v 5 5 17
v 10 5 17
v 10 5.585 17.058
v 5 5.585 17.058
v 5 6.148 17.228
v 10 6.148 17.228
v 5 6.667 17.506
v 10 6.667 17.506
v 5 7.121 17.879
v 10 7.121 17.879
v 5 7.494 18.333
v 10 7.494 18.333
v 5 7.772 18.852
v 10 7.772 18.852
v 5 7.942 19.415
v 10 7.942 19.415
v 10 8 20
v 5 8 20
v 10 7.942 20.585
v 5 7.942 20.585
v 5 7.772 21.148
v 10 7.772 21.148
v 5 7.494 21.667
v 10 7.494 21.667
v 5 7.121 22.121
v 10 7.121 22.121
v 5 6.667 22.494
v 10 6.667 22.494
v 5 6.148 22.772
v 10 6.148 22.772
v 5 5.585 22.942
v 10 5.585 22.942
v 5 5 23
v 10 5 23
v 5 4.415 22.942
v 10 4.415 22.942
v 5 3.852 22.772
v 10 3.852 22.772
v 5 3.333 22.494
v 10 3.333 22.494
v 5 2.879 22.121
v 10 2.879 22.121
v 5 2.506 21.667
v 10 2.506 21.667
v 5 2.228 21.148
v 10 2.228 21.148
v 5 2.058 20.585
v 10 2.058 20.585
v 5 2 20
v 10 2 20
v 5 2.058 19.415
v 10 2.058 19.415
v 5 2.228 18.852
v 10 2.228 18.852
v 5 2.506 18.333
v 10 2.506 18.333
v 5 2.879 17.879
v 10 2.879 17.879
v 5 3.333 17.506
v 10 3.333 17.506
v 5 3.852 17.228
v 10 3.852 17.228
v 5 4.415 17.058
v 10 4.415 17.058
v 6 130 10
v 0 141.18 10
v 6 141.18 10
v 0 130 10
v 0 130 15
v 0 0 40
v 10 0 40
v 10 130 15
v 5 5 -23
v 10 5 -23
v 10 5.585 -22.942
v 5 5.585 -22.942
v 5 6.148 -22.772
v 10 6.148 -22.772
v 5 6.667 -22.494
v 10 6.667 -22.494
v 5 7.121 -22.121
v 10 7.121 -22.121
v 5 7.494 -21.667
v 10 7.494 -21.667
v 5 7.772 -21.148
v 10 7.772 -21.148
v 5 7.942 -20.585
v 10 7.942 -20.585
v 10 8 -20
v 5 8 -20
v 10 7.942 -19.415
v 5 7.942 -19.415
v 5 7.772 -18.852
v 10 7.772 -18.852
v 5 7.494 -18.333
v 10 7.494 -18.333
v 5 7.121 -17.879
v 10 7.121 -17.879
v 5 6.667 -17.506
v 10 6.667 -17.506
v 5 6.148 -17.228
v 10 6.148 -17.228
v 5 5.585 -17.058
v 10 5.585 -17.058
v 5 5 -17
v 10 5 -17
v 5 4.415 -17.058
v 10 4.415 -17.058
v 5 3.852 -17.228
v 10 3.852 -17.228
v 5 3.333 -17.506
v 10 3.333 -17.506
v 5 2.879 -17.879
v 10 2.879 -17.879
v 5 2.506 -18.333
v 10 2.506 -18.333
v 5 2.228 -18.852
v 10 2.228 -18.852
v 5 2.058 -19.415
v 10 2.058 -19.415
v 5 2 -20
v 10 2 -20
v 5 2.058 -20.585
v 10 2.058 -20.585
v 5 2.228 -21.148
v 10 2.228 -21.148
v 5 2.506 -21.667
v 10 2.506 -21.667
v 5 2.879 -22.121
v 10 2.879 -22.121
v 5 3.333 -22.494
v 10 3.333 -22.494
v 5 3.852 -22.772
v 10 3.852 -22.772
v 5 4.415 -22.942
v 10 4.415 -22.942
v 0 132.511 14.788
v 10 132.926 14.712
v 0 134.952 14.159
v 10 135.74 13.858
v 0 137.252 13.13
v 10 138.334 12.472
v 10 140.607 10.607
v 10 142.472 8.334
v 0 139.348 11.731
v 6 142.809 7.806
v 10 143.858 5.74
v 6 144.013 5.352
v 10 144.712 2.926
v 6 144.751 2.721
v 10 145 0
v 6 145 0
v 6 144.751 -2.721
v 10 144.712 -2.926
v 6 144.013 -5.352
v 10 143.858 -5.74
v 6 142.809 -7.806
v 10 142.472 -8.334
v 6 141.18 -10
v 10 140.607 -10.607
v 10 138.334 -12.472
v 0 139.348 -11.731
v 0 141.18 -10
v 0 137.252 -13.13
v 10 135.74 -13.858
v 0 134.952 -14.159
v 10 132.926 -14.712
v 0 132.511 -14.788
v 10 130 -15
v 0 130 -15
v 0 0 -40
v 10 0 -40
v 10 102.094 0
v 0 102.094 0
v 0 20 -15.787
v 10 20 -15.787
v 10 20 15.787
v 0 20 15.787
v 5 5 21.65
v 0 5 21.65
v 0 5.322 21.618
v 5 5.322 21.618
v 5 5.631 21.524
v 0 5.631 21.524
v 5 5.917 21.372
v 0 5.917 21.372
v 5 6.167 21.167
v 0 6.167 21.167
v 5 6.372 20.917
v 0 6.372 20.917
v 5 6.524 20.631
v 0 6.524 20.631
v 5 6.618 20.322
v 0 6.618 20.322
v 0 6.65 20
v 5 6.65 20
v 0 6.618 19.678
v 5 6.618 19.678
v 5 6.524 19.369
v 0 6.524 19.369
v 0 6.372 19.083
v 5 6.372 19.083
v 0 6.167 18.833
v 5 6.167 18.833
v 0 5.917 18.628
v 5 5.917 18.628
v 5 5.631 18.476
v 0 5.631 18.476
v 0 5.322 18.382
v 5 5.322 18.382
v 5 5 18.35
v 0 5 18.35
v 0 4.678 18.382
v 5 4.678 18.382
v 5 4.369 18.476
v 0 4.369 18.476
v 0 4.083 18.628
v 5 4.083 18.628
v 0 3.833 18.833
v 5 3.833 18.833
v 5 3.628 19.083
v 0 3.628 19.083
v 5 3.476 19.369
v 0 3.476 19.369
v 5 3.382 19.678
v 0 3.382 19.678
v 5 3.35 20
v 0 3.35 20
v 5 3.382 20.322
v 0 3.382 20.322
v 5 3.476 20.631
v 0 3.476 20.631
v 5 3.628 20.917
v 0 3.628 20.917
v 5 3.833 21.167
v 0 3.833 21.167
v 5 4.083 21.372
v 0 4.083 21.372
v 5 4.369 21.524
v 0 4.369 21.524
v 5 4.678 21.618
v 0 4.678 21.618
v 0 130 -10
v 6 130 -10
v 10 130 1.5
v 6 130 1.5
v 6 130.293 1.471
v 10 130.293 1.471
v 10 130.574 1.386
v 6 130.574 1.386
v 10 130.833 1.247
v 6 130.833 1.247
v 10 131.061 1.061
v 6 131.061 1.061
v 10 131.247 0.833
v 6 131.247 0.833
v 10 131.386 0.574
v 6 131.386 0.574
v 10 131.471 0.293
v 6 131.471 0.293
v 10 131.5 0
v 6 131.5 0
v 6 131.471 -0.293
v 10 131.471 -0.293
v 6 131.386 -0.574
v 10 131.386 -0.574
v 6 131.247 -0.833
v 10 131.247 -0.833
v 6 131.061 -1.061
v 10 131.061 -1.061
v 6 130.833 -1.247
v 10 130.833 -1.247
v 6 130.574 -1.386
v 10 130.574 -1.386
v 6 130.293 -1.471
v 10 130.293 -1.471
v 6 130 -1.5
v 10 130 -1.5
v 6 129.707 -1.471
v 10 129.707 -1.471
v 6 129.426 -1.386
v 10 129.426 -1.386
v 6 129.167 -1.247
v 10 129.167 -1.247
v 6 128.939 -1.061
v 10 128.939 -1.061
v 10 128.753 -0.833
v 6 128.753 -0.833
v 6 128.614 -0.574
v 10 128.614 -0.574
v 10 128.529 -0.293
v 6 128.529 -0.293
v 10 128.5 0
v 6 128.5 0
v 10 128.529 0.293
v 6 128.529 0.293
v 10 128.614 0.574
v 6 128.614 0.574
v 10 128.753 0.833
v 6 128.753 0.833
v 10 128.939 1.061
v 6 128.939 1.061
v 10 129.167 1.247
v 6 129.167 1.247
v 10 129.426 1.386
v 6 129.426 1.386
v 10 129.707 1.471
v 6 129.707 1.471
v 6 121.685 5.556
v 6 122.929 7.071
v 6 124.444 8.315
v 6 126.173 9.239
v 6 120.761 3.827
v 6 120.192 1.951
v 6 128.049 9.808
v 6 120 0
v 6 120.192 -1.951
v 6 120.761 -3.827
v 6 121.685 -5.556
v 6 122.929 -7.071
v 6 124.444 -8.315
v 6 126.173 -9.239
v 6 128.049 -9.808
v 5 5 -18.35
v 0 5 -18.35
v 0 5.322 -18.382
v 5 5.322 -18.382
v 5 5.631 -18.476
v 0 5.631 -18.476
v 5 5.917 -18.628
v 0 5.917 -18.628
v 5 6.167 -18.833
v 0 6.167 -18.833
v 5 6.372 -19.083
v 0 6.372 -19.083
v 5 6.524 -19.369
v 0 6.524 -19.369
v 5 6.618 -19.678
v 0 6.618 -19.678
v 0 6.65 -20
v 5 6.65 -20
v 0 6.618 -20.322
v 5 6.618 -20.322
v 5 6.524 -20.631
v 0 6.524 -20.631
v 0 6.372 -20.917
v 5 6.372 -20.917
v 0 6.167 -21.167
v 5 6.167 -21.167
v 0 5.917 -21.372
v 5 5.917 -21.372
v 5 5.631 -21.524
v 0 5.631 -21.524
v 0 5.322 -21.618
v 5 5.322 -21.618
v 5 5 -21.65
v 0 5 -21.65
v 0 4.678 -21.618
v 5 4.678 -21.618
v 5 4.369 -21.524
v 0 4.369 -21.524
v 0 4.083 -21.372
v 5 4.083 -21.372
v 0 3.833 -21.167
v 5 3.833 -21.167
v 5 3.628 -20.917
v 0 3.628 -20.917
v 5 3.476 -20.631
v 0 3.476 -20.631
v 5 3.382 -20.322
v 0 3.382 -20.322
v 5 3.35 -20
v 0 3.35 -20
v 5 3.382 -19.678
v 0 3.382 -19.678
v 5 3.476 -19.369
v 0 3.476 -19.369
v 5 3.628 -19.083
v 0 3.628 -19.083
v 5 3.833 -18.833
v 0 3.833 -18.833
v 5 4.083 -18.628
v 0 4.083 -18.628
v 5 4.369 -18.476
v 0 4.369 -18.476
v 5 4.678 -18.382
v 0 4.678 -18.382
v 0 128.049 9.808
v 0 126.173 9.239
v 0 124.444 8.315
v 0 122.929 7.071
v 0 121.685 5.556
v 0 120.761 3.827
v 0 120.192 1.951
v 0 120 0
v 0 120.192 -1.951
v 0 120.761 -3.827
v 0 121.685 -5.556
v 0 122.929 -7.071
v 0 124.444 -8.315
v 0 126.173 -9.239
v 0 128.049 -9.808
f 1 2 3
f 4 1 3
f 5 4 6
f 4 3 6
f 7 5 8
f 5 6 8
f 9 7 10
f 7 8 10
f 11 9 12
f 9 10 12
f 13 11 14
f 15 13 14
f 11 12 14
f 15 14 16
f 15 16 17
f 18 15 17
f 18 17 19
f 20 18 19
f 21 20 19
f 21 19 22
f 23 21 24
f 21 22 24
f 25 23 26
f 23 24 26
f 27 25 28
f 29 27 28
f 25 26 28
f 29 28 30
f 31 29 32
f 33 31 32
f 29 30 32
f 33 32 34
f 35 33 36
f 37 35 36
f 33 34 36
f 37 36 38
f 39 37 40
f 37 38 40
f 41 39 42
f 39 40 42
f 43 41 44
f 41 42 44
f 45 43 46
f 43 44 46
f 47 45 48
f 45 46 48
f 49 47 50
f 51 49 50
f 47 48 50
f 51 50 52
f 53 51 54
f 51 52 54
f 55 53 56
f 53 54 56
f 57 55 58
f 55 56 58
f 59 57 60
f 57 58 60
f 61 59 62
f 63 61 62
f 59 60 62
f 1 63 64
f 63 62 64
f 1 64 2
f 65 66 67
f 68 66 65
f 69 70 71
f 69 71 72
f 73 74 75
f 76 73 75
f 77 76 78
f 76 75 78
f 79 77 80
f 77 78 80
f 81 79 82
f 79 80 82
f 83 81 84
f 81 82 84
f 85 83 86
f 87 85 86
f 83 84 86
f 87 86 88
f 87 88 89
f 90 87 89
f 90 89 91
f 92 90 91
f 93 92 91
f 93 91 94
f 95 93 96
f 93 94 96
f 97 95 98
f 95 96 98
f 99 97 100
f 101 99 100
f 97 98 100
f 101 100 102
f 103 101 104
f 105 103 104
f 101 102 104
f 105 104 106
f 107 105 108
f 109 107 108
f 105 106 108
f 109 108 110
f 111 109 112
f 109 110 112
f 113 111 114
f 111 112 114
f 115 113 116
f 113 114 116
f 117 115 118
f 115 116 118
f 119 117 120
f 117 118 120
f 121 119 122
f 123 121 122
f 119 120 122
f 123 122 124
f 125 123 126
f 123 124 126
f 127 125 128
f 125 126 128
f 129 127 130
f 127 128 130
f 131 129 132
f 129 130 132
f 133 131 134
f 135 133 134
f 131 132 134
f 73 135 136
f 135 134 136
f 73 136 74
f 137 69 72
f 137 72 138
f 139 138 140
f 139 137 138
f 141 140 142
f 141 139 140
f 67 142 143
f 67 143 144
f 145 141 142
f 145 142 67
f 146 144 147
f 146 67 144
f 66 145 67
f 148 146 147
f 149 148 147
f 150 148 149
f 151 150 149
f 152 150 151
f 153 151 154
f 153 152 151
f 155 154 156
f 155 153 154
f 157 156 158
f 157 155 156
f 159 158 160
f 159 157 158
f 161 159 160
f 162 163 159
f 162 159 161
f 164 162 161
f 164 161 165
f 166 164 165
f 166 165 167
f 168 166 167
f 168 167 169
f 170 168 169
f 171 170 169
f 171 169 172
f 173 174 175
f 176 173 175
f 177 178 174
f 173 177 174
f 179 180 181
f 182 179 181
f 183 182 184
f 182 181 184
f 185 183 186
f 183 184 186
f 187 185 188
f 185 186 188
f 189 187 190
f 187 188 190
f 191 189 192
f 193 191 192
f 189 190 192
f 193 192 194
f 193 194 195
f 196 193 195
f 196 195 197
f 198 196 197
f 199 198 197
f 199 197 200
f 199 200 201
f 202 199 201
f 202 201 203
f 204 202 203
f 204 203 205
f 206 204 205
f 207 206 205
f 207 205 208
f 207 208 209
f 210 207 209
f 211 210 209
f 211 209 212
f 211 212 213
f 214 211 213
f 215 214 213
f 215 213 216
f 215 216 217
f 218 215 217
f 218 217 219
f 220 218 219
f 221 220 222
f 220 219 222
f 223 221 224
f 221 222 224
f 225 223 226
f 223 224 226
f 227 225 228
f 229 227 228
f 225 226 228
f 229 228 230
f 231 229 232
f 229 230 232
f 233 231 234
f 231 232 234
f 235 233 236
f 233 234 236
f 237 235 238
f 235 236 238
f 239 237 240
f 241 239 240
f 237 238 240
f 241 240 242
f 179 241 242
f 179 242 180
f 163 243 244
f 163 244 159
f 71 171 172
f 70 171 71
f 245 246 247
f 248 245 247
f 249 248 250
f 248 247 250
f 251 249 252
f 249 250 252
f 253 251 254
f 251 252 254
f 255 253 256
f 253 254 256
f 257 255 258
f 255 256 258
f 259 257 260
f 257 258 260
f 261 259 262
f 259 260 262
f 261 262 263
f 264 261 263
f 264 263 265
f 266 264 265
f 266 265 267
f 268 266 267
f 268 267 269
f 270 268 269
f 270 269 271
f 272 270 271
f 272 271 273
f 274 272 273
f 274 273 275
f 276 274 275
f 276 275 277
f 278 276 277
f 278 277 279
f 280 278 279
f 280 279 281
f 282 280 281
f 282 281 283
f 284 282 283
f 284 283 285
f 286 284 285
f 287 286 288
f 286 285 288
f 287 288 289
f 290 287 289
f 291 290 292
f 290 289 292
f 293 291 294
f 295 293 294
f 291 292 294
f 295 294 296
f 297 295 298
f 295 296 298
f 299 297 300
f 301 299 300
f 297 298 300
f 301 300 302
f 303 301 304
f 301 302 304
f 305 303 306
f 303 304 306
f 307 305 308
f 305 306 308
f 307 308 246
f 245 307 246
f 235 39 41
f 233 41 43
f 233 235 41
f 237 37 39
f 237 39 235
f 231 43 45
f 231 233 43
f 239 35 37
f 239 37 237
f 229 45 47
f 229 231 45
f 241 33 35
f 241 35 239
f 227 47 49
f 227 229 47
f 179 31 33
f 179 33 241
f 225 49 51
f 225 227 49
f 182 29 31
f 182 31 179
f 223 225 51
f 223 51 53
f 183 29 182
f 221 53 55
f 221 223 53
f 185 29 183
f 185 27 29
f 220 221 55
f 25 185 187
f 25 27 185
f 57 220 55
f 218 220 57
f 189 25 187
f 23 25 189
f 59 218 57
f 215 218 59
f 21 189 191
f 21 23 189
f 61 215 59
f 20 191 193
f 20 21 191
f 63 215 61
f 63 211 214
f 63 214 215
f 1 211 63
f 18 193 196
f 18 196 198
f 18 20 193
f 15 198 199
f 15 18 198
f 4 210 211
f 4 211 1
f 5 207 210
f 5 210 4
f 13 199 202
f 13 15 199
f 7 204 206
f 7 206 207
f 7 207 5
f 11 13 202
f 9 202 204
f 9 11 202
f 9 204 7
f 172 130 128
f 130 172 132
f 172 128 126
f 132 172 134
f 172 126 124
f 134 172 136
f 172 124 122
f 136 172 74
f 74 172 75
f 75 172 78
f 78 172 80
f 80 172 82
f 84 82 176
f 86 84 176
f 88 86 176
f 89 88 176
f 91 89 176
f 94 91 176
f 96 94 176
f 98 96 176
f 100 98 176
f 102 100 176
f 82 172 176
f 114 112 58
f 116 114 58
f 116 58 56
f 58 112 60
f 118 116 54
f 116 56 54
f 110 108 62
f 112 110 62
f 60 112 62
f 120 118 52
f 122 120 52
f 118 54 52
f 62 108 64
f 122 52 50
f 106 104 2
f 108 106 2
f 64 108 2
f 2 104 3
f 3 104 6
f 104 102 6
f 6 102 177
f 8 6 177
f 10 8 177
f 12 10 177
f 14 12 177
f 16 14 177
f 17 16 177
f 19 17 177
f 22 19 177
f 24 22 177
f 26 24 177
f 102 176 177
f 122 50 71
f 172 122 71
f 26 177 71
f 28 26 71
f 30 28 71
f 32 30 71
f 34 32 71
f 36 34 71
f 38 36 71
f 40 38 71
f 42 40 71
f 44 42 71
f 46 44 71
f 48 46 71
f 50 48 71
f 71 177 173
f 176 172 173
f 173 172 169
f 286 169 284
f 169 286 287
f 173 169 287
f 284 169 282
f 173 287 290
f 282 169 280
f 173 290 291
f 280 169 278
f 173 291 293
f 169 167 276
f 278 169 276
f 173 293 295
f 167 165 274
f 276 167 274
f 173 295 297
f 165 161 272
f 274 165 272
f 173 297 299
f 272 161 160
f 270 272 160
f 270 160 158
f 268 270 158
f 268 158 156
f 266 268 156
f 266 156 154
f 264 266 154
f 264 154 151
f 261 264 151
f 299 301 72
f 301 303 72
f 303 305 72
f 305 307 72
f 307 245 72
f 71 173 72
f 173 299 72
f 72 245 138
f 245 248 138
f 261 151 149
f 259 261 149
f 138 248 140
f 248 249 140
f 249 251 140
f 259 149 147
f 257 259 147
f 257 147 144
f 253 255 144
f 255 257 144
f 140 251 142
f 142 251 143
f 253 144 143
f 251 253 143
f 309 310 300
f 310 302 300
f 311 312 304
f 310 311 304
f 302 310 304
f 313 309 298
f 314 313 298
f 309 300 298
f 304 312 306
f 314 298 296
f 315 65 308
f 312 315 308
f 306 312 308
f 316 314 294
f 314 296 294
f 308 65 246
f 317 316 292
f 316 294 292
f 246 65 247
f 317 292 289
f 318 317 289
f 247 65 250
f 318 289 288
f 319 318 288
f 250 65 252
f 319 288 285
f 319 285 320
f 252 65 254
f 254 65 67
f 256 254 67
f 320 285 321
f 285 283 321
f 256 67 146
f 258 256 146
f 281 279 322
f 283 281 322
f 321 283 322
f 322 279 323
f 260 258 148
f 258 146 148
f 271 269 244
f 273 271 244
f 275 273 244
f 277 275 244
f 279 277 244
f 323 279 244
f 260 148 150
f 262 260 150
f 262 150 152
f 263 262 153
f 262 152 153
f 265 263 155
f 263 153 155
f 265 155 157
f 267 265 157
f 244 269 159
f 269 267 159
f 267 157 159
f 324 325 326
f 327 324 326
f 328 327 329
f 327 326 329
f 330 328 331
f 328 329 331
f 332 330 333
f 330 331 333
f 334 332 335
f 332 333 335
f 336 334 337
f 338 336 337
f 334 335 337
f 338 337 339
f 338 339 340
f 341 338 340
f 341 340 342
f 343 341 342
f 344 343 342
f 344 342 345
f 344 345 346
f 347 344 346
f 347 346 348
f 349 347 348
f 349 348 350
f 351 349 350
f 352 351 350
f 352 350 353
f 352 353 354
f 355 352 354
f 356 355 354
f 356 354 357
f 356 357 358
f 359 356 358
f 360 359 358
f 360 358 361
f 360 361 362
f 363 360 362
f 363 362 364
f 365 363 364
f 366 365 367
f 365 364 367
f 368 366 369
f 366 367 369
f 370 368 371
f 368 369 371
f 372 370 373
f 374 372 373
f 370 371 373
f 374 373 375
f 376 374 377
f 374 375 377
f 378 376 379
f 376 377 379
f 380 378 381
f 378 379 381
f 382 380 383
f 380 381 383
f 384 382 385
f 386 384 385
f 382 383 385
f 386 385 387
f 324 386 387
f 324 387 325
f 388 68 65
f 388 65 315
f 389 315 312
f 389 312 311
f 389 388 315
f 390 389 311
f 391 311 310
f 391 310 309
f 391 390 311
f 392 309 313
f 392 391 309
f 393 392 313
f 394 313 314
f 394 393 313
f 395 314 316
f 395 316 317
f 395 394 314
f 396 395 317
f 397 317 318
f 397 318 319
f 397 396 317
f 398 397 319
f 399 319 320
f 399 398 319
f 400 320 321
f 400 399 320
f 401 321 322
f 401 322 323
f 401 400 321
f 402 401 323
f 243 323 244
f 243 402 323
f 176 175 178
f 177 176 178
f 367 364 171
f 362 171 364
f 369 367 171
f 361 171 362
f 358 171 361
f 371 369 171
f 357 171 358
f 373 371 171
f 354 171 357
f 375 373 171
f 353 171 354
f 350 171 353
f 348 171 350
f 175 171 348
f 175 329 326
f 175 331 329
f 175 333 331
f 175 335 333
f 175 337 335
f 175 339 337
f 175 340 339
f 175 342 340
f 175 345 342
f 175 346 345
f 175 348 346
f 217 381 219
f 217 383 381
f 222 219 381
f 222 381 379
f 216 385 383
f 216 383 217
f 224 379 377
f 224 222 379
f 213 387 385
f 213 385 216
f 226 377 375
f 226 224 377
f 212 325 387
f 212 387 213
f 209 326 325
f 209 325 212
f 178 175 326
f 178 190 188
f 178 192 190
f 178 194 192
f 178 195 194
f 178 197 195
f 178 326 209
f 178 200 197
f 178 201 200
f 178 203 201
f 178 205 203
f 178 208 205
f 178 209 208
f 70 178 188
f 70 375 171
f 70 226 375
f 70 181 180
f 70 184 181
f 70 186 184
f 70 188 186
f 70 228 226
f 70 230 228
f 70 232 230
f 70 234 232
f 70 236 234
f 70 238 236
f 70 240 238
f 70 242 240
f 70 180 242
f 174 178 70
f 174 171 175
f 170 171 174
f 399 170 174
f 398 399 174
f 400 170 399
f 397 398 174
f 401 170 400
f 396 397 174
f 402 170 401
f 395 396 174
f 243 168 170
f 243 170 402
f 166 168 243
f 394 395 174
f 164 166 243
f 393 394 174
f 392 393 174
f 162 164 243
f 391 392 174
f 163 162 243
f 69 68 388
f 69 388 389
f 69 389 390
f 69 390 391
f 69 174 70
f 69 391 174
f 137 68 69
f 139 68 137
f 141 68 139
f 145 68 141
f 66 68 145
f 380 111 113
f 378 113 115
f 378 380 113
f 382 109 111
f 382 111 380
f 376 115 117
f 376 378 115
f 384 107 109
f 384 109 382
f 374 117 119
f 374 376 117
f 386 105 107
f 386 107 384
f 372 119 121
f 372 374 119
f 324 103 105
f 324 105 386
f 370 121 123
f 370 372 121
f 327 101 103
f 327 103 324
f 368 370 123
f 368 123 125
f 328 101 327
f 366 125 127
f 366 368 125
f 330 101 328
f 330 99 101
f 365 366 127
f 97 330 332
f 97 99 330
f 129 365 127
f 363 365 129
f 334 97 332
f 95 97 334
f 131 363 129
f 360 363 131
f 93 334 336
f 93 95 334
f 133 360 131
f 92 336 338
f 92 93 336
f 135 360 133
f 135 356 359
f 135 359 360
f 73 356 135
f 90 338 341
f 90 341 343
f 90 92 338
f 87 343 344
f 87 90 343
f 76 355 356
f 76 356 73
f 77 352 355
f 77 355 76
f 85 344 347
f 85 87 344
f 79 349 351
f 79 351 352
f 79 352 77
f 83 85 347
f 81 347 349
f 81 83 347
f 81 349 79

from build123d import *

# Parameters (mm, degrees)
BOSS_EXTRUDE1_DEPTH = 10
CUT_EXTRUDE1_DEPTH  = 6
SKETCH4_R           = 1.65
CUT_EXTRUDE2_DEPTH  = 11
SKETCH5_R           = 3
CUT_EXTRUDE3_DEPTH  = 5
SKETCH6_R           = 1.5
CUT_EXTRUDE4_DEPTH  = 5
CUT_EXTRUDE6_DEPTH  = 11


with BuildPart() as part:
    # Sketch2 → Boss-Extrude1 (new body)
    with BuildSketch(Plane(origin=(0, 0, 0), x_dir=(0, 0, -1), z_dir=(1, 0, 0))):
        with BuildLine():
            Line((40, 0), (-40, 0))
            Line((-40, 0), (-15, 130))
            ThreePointArc((-15, 130), (0, 145), (15, 130))
            Line((15, 130), (40, 0))
        make_face()
    extrude(amount=BOSS_EXTRUDE1_DEPTH)

    # Sketch3 → Cut-Extrude1 (cut)
    with BuildSketch(Plane.ZY):
        with BuildLine():
            Line((-10, 130), (-10, 151.126505972))
            Line((-10, 151.126505972), (10, 151.126505972))
            Line((10, 151.126505972), (10, 130))
            ThreePointArc((10, 130), (0, 120), (-10, 130))
        make_face()
    extrude(amount=-CUT_EXTRUDE1_DEPTH, mode=Mode.SUBTRACT)

    # Sketch4 → Cut-Extrude2 (cut, through all)
    with BuildSketch(Plane.ZY):
        with Locations((20, 5)):
            Circle(SKETCH4_R)
        with Locations((-20, 5)):
            Circle(SKETCH4_R)
    extrude(amount=-CUT_EXTRUDE2_DEPTH, mode=Mode.SUBTRACT)

    # Sketch5 → Cut-Extrude3 (cut)
    with BuildSketch(Plane(origin=(10, 0, 0), x_dir=(0, 0, -1), z_dir=(1, 0, 0))):
        with Locations((-20, 5)):
            Circle(SKETCH5_R)
        with Locations((20, 5)):
            Circle(SKETCH5_R)
    extrude(amount=-CUT_EXTRUDE3_DEPTH, mode=Mode.SUBTRACT)

    # Sketch6 → Cut-Extrude4 (cut, through all)
    with BuildSketch(Plane.ZY.offset(-6)):
        with Locations((0, 130)):
            Circle(SKETCH6_R)
    extrude(amount=-CUT_EXTRUDE4_DEPTH, mode=Mode.SUBTRACT)

    # Sketch7 → Cut-Extrude6 (cut, through all)
    with BuildSketch(Plane.ZY):
        Polygon((0, 102.094381641), (-15.787381085, 20), (15.787381085, 20), align=None)
    extrude(amount=-CUT_EXTRUDE6_DEPTH, mode=Mode.SUBTRACT)


solid = part.part
